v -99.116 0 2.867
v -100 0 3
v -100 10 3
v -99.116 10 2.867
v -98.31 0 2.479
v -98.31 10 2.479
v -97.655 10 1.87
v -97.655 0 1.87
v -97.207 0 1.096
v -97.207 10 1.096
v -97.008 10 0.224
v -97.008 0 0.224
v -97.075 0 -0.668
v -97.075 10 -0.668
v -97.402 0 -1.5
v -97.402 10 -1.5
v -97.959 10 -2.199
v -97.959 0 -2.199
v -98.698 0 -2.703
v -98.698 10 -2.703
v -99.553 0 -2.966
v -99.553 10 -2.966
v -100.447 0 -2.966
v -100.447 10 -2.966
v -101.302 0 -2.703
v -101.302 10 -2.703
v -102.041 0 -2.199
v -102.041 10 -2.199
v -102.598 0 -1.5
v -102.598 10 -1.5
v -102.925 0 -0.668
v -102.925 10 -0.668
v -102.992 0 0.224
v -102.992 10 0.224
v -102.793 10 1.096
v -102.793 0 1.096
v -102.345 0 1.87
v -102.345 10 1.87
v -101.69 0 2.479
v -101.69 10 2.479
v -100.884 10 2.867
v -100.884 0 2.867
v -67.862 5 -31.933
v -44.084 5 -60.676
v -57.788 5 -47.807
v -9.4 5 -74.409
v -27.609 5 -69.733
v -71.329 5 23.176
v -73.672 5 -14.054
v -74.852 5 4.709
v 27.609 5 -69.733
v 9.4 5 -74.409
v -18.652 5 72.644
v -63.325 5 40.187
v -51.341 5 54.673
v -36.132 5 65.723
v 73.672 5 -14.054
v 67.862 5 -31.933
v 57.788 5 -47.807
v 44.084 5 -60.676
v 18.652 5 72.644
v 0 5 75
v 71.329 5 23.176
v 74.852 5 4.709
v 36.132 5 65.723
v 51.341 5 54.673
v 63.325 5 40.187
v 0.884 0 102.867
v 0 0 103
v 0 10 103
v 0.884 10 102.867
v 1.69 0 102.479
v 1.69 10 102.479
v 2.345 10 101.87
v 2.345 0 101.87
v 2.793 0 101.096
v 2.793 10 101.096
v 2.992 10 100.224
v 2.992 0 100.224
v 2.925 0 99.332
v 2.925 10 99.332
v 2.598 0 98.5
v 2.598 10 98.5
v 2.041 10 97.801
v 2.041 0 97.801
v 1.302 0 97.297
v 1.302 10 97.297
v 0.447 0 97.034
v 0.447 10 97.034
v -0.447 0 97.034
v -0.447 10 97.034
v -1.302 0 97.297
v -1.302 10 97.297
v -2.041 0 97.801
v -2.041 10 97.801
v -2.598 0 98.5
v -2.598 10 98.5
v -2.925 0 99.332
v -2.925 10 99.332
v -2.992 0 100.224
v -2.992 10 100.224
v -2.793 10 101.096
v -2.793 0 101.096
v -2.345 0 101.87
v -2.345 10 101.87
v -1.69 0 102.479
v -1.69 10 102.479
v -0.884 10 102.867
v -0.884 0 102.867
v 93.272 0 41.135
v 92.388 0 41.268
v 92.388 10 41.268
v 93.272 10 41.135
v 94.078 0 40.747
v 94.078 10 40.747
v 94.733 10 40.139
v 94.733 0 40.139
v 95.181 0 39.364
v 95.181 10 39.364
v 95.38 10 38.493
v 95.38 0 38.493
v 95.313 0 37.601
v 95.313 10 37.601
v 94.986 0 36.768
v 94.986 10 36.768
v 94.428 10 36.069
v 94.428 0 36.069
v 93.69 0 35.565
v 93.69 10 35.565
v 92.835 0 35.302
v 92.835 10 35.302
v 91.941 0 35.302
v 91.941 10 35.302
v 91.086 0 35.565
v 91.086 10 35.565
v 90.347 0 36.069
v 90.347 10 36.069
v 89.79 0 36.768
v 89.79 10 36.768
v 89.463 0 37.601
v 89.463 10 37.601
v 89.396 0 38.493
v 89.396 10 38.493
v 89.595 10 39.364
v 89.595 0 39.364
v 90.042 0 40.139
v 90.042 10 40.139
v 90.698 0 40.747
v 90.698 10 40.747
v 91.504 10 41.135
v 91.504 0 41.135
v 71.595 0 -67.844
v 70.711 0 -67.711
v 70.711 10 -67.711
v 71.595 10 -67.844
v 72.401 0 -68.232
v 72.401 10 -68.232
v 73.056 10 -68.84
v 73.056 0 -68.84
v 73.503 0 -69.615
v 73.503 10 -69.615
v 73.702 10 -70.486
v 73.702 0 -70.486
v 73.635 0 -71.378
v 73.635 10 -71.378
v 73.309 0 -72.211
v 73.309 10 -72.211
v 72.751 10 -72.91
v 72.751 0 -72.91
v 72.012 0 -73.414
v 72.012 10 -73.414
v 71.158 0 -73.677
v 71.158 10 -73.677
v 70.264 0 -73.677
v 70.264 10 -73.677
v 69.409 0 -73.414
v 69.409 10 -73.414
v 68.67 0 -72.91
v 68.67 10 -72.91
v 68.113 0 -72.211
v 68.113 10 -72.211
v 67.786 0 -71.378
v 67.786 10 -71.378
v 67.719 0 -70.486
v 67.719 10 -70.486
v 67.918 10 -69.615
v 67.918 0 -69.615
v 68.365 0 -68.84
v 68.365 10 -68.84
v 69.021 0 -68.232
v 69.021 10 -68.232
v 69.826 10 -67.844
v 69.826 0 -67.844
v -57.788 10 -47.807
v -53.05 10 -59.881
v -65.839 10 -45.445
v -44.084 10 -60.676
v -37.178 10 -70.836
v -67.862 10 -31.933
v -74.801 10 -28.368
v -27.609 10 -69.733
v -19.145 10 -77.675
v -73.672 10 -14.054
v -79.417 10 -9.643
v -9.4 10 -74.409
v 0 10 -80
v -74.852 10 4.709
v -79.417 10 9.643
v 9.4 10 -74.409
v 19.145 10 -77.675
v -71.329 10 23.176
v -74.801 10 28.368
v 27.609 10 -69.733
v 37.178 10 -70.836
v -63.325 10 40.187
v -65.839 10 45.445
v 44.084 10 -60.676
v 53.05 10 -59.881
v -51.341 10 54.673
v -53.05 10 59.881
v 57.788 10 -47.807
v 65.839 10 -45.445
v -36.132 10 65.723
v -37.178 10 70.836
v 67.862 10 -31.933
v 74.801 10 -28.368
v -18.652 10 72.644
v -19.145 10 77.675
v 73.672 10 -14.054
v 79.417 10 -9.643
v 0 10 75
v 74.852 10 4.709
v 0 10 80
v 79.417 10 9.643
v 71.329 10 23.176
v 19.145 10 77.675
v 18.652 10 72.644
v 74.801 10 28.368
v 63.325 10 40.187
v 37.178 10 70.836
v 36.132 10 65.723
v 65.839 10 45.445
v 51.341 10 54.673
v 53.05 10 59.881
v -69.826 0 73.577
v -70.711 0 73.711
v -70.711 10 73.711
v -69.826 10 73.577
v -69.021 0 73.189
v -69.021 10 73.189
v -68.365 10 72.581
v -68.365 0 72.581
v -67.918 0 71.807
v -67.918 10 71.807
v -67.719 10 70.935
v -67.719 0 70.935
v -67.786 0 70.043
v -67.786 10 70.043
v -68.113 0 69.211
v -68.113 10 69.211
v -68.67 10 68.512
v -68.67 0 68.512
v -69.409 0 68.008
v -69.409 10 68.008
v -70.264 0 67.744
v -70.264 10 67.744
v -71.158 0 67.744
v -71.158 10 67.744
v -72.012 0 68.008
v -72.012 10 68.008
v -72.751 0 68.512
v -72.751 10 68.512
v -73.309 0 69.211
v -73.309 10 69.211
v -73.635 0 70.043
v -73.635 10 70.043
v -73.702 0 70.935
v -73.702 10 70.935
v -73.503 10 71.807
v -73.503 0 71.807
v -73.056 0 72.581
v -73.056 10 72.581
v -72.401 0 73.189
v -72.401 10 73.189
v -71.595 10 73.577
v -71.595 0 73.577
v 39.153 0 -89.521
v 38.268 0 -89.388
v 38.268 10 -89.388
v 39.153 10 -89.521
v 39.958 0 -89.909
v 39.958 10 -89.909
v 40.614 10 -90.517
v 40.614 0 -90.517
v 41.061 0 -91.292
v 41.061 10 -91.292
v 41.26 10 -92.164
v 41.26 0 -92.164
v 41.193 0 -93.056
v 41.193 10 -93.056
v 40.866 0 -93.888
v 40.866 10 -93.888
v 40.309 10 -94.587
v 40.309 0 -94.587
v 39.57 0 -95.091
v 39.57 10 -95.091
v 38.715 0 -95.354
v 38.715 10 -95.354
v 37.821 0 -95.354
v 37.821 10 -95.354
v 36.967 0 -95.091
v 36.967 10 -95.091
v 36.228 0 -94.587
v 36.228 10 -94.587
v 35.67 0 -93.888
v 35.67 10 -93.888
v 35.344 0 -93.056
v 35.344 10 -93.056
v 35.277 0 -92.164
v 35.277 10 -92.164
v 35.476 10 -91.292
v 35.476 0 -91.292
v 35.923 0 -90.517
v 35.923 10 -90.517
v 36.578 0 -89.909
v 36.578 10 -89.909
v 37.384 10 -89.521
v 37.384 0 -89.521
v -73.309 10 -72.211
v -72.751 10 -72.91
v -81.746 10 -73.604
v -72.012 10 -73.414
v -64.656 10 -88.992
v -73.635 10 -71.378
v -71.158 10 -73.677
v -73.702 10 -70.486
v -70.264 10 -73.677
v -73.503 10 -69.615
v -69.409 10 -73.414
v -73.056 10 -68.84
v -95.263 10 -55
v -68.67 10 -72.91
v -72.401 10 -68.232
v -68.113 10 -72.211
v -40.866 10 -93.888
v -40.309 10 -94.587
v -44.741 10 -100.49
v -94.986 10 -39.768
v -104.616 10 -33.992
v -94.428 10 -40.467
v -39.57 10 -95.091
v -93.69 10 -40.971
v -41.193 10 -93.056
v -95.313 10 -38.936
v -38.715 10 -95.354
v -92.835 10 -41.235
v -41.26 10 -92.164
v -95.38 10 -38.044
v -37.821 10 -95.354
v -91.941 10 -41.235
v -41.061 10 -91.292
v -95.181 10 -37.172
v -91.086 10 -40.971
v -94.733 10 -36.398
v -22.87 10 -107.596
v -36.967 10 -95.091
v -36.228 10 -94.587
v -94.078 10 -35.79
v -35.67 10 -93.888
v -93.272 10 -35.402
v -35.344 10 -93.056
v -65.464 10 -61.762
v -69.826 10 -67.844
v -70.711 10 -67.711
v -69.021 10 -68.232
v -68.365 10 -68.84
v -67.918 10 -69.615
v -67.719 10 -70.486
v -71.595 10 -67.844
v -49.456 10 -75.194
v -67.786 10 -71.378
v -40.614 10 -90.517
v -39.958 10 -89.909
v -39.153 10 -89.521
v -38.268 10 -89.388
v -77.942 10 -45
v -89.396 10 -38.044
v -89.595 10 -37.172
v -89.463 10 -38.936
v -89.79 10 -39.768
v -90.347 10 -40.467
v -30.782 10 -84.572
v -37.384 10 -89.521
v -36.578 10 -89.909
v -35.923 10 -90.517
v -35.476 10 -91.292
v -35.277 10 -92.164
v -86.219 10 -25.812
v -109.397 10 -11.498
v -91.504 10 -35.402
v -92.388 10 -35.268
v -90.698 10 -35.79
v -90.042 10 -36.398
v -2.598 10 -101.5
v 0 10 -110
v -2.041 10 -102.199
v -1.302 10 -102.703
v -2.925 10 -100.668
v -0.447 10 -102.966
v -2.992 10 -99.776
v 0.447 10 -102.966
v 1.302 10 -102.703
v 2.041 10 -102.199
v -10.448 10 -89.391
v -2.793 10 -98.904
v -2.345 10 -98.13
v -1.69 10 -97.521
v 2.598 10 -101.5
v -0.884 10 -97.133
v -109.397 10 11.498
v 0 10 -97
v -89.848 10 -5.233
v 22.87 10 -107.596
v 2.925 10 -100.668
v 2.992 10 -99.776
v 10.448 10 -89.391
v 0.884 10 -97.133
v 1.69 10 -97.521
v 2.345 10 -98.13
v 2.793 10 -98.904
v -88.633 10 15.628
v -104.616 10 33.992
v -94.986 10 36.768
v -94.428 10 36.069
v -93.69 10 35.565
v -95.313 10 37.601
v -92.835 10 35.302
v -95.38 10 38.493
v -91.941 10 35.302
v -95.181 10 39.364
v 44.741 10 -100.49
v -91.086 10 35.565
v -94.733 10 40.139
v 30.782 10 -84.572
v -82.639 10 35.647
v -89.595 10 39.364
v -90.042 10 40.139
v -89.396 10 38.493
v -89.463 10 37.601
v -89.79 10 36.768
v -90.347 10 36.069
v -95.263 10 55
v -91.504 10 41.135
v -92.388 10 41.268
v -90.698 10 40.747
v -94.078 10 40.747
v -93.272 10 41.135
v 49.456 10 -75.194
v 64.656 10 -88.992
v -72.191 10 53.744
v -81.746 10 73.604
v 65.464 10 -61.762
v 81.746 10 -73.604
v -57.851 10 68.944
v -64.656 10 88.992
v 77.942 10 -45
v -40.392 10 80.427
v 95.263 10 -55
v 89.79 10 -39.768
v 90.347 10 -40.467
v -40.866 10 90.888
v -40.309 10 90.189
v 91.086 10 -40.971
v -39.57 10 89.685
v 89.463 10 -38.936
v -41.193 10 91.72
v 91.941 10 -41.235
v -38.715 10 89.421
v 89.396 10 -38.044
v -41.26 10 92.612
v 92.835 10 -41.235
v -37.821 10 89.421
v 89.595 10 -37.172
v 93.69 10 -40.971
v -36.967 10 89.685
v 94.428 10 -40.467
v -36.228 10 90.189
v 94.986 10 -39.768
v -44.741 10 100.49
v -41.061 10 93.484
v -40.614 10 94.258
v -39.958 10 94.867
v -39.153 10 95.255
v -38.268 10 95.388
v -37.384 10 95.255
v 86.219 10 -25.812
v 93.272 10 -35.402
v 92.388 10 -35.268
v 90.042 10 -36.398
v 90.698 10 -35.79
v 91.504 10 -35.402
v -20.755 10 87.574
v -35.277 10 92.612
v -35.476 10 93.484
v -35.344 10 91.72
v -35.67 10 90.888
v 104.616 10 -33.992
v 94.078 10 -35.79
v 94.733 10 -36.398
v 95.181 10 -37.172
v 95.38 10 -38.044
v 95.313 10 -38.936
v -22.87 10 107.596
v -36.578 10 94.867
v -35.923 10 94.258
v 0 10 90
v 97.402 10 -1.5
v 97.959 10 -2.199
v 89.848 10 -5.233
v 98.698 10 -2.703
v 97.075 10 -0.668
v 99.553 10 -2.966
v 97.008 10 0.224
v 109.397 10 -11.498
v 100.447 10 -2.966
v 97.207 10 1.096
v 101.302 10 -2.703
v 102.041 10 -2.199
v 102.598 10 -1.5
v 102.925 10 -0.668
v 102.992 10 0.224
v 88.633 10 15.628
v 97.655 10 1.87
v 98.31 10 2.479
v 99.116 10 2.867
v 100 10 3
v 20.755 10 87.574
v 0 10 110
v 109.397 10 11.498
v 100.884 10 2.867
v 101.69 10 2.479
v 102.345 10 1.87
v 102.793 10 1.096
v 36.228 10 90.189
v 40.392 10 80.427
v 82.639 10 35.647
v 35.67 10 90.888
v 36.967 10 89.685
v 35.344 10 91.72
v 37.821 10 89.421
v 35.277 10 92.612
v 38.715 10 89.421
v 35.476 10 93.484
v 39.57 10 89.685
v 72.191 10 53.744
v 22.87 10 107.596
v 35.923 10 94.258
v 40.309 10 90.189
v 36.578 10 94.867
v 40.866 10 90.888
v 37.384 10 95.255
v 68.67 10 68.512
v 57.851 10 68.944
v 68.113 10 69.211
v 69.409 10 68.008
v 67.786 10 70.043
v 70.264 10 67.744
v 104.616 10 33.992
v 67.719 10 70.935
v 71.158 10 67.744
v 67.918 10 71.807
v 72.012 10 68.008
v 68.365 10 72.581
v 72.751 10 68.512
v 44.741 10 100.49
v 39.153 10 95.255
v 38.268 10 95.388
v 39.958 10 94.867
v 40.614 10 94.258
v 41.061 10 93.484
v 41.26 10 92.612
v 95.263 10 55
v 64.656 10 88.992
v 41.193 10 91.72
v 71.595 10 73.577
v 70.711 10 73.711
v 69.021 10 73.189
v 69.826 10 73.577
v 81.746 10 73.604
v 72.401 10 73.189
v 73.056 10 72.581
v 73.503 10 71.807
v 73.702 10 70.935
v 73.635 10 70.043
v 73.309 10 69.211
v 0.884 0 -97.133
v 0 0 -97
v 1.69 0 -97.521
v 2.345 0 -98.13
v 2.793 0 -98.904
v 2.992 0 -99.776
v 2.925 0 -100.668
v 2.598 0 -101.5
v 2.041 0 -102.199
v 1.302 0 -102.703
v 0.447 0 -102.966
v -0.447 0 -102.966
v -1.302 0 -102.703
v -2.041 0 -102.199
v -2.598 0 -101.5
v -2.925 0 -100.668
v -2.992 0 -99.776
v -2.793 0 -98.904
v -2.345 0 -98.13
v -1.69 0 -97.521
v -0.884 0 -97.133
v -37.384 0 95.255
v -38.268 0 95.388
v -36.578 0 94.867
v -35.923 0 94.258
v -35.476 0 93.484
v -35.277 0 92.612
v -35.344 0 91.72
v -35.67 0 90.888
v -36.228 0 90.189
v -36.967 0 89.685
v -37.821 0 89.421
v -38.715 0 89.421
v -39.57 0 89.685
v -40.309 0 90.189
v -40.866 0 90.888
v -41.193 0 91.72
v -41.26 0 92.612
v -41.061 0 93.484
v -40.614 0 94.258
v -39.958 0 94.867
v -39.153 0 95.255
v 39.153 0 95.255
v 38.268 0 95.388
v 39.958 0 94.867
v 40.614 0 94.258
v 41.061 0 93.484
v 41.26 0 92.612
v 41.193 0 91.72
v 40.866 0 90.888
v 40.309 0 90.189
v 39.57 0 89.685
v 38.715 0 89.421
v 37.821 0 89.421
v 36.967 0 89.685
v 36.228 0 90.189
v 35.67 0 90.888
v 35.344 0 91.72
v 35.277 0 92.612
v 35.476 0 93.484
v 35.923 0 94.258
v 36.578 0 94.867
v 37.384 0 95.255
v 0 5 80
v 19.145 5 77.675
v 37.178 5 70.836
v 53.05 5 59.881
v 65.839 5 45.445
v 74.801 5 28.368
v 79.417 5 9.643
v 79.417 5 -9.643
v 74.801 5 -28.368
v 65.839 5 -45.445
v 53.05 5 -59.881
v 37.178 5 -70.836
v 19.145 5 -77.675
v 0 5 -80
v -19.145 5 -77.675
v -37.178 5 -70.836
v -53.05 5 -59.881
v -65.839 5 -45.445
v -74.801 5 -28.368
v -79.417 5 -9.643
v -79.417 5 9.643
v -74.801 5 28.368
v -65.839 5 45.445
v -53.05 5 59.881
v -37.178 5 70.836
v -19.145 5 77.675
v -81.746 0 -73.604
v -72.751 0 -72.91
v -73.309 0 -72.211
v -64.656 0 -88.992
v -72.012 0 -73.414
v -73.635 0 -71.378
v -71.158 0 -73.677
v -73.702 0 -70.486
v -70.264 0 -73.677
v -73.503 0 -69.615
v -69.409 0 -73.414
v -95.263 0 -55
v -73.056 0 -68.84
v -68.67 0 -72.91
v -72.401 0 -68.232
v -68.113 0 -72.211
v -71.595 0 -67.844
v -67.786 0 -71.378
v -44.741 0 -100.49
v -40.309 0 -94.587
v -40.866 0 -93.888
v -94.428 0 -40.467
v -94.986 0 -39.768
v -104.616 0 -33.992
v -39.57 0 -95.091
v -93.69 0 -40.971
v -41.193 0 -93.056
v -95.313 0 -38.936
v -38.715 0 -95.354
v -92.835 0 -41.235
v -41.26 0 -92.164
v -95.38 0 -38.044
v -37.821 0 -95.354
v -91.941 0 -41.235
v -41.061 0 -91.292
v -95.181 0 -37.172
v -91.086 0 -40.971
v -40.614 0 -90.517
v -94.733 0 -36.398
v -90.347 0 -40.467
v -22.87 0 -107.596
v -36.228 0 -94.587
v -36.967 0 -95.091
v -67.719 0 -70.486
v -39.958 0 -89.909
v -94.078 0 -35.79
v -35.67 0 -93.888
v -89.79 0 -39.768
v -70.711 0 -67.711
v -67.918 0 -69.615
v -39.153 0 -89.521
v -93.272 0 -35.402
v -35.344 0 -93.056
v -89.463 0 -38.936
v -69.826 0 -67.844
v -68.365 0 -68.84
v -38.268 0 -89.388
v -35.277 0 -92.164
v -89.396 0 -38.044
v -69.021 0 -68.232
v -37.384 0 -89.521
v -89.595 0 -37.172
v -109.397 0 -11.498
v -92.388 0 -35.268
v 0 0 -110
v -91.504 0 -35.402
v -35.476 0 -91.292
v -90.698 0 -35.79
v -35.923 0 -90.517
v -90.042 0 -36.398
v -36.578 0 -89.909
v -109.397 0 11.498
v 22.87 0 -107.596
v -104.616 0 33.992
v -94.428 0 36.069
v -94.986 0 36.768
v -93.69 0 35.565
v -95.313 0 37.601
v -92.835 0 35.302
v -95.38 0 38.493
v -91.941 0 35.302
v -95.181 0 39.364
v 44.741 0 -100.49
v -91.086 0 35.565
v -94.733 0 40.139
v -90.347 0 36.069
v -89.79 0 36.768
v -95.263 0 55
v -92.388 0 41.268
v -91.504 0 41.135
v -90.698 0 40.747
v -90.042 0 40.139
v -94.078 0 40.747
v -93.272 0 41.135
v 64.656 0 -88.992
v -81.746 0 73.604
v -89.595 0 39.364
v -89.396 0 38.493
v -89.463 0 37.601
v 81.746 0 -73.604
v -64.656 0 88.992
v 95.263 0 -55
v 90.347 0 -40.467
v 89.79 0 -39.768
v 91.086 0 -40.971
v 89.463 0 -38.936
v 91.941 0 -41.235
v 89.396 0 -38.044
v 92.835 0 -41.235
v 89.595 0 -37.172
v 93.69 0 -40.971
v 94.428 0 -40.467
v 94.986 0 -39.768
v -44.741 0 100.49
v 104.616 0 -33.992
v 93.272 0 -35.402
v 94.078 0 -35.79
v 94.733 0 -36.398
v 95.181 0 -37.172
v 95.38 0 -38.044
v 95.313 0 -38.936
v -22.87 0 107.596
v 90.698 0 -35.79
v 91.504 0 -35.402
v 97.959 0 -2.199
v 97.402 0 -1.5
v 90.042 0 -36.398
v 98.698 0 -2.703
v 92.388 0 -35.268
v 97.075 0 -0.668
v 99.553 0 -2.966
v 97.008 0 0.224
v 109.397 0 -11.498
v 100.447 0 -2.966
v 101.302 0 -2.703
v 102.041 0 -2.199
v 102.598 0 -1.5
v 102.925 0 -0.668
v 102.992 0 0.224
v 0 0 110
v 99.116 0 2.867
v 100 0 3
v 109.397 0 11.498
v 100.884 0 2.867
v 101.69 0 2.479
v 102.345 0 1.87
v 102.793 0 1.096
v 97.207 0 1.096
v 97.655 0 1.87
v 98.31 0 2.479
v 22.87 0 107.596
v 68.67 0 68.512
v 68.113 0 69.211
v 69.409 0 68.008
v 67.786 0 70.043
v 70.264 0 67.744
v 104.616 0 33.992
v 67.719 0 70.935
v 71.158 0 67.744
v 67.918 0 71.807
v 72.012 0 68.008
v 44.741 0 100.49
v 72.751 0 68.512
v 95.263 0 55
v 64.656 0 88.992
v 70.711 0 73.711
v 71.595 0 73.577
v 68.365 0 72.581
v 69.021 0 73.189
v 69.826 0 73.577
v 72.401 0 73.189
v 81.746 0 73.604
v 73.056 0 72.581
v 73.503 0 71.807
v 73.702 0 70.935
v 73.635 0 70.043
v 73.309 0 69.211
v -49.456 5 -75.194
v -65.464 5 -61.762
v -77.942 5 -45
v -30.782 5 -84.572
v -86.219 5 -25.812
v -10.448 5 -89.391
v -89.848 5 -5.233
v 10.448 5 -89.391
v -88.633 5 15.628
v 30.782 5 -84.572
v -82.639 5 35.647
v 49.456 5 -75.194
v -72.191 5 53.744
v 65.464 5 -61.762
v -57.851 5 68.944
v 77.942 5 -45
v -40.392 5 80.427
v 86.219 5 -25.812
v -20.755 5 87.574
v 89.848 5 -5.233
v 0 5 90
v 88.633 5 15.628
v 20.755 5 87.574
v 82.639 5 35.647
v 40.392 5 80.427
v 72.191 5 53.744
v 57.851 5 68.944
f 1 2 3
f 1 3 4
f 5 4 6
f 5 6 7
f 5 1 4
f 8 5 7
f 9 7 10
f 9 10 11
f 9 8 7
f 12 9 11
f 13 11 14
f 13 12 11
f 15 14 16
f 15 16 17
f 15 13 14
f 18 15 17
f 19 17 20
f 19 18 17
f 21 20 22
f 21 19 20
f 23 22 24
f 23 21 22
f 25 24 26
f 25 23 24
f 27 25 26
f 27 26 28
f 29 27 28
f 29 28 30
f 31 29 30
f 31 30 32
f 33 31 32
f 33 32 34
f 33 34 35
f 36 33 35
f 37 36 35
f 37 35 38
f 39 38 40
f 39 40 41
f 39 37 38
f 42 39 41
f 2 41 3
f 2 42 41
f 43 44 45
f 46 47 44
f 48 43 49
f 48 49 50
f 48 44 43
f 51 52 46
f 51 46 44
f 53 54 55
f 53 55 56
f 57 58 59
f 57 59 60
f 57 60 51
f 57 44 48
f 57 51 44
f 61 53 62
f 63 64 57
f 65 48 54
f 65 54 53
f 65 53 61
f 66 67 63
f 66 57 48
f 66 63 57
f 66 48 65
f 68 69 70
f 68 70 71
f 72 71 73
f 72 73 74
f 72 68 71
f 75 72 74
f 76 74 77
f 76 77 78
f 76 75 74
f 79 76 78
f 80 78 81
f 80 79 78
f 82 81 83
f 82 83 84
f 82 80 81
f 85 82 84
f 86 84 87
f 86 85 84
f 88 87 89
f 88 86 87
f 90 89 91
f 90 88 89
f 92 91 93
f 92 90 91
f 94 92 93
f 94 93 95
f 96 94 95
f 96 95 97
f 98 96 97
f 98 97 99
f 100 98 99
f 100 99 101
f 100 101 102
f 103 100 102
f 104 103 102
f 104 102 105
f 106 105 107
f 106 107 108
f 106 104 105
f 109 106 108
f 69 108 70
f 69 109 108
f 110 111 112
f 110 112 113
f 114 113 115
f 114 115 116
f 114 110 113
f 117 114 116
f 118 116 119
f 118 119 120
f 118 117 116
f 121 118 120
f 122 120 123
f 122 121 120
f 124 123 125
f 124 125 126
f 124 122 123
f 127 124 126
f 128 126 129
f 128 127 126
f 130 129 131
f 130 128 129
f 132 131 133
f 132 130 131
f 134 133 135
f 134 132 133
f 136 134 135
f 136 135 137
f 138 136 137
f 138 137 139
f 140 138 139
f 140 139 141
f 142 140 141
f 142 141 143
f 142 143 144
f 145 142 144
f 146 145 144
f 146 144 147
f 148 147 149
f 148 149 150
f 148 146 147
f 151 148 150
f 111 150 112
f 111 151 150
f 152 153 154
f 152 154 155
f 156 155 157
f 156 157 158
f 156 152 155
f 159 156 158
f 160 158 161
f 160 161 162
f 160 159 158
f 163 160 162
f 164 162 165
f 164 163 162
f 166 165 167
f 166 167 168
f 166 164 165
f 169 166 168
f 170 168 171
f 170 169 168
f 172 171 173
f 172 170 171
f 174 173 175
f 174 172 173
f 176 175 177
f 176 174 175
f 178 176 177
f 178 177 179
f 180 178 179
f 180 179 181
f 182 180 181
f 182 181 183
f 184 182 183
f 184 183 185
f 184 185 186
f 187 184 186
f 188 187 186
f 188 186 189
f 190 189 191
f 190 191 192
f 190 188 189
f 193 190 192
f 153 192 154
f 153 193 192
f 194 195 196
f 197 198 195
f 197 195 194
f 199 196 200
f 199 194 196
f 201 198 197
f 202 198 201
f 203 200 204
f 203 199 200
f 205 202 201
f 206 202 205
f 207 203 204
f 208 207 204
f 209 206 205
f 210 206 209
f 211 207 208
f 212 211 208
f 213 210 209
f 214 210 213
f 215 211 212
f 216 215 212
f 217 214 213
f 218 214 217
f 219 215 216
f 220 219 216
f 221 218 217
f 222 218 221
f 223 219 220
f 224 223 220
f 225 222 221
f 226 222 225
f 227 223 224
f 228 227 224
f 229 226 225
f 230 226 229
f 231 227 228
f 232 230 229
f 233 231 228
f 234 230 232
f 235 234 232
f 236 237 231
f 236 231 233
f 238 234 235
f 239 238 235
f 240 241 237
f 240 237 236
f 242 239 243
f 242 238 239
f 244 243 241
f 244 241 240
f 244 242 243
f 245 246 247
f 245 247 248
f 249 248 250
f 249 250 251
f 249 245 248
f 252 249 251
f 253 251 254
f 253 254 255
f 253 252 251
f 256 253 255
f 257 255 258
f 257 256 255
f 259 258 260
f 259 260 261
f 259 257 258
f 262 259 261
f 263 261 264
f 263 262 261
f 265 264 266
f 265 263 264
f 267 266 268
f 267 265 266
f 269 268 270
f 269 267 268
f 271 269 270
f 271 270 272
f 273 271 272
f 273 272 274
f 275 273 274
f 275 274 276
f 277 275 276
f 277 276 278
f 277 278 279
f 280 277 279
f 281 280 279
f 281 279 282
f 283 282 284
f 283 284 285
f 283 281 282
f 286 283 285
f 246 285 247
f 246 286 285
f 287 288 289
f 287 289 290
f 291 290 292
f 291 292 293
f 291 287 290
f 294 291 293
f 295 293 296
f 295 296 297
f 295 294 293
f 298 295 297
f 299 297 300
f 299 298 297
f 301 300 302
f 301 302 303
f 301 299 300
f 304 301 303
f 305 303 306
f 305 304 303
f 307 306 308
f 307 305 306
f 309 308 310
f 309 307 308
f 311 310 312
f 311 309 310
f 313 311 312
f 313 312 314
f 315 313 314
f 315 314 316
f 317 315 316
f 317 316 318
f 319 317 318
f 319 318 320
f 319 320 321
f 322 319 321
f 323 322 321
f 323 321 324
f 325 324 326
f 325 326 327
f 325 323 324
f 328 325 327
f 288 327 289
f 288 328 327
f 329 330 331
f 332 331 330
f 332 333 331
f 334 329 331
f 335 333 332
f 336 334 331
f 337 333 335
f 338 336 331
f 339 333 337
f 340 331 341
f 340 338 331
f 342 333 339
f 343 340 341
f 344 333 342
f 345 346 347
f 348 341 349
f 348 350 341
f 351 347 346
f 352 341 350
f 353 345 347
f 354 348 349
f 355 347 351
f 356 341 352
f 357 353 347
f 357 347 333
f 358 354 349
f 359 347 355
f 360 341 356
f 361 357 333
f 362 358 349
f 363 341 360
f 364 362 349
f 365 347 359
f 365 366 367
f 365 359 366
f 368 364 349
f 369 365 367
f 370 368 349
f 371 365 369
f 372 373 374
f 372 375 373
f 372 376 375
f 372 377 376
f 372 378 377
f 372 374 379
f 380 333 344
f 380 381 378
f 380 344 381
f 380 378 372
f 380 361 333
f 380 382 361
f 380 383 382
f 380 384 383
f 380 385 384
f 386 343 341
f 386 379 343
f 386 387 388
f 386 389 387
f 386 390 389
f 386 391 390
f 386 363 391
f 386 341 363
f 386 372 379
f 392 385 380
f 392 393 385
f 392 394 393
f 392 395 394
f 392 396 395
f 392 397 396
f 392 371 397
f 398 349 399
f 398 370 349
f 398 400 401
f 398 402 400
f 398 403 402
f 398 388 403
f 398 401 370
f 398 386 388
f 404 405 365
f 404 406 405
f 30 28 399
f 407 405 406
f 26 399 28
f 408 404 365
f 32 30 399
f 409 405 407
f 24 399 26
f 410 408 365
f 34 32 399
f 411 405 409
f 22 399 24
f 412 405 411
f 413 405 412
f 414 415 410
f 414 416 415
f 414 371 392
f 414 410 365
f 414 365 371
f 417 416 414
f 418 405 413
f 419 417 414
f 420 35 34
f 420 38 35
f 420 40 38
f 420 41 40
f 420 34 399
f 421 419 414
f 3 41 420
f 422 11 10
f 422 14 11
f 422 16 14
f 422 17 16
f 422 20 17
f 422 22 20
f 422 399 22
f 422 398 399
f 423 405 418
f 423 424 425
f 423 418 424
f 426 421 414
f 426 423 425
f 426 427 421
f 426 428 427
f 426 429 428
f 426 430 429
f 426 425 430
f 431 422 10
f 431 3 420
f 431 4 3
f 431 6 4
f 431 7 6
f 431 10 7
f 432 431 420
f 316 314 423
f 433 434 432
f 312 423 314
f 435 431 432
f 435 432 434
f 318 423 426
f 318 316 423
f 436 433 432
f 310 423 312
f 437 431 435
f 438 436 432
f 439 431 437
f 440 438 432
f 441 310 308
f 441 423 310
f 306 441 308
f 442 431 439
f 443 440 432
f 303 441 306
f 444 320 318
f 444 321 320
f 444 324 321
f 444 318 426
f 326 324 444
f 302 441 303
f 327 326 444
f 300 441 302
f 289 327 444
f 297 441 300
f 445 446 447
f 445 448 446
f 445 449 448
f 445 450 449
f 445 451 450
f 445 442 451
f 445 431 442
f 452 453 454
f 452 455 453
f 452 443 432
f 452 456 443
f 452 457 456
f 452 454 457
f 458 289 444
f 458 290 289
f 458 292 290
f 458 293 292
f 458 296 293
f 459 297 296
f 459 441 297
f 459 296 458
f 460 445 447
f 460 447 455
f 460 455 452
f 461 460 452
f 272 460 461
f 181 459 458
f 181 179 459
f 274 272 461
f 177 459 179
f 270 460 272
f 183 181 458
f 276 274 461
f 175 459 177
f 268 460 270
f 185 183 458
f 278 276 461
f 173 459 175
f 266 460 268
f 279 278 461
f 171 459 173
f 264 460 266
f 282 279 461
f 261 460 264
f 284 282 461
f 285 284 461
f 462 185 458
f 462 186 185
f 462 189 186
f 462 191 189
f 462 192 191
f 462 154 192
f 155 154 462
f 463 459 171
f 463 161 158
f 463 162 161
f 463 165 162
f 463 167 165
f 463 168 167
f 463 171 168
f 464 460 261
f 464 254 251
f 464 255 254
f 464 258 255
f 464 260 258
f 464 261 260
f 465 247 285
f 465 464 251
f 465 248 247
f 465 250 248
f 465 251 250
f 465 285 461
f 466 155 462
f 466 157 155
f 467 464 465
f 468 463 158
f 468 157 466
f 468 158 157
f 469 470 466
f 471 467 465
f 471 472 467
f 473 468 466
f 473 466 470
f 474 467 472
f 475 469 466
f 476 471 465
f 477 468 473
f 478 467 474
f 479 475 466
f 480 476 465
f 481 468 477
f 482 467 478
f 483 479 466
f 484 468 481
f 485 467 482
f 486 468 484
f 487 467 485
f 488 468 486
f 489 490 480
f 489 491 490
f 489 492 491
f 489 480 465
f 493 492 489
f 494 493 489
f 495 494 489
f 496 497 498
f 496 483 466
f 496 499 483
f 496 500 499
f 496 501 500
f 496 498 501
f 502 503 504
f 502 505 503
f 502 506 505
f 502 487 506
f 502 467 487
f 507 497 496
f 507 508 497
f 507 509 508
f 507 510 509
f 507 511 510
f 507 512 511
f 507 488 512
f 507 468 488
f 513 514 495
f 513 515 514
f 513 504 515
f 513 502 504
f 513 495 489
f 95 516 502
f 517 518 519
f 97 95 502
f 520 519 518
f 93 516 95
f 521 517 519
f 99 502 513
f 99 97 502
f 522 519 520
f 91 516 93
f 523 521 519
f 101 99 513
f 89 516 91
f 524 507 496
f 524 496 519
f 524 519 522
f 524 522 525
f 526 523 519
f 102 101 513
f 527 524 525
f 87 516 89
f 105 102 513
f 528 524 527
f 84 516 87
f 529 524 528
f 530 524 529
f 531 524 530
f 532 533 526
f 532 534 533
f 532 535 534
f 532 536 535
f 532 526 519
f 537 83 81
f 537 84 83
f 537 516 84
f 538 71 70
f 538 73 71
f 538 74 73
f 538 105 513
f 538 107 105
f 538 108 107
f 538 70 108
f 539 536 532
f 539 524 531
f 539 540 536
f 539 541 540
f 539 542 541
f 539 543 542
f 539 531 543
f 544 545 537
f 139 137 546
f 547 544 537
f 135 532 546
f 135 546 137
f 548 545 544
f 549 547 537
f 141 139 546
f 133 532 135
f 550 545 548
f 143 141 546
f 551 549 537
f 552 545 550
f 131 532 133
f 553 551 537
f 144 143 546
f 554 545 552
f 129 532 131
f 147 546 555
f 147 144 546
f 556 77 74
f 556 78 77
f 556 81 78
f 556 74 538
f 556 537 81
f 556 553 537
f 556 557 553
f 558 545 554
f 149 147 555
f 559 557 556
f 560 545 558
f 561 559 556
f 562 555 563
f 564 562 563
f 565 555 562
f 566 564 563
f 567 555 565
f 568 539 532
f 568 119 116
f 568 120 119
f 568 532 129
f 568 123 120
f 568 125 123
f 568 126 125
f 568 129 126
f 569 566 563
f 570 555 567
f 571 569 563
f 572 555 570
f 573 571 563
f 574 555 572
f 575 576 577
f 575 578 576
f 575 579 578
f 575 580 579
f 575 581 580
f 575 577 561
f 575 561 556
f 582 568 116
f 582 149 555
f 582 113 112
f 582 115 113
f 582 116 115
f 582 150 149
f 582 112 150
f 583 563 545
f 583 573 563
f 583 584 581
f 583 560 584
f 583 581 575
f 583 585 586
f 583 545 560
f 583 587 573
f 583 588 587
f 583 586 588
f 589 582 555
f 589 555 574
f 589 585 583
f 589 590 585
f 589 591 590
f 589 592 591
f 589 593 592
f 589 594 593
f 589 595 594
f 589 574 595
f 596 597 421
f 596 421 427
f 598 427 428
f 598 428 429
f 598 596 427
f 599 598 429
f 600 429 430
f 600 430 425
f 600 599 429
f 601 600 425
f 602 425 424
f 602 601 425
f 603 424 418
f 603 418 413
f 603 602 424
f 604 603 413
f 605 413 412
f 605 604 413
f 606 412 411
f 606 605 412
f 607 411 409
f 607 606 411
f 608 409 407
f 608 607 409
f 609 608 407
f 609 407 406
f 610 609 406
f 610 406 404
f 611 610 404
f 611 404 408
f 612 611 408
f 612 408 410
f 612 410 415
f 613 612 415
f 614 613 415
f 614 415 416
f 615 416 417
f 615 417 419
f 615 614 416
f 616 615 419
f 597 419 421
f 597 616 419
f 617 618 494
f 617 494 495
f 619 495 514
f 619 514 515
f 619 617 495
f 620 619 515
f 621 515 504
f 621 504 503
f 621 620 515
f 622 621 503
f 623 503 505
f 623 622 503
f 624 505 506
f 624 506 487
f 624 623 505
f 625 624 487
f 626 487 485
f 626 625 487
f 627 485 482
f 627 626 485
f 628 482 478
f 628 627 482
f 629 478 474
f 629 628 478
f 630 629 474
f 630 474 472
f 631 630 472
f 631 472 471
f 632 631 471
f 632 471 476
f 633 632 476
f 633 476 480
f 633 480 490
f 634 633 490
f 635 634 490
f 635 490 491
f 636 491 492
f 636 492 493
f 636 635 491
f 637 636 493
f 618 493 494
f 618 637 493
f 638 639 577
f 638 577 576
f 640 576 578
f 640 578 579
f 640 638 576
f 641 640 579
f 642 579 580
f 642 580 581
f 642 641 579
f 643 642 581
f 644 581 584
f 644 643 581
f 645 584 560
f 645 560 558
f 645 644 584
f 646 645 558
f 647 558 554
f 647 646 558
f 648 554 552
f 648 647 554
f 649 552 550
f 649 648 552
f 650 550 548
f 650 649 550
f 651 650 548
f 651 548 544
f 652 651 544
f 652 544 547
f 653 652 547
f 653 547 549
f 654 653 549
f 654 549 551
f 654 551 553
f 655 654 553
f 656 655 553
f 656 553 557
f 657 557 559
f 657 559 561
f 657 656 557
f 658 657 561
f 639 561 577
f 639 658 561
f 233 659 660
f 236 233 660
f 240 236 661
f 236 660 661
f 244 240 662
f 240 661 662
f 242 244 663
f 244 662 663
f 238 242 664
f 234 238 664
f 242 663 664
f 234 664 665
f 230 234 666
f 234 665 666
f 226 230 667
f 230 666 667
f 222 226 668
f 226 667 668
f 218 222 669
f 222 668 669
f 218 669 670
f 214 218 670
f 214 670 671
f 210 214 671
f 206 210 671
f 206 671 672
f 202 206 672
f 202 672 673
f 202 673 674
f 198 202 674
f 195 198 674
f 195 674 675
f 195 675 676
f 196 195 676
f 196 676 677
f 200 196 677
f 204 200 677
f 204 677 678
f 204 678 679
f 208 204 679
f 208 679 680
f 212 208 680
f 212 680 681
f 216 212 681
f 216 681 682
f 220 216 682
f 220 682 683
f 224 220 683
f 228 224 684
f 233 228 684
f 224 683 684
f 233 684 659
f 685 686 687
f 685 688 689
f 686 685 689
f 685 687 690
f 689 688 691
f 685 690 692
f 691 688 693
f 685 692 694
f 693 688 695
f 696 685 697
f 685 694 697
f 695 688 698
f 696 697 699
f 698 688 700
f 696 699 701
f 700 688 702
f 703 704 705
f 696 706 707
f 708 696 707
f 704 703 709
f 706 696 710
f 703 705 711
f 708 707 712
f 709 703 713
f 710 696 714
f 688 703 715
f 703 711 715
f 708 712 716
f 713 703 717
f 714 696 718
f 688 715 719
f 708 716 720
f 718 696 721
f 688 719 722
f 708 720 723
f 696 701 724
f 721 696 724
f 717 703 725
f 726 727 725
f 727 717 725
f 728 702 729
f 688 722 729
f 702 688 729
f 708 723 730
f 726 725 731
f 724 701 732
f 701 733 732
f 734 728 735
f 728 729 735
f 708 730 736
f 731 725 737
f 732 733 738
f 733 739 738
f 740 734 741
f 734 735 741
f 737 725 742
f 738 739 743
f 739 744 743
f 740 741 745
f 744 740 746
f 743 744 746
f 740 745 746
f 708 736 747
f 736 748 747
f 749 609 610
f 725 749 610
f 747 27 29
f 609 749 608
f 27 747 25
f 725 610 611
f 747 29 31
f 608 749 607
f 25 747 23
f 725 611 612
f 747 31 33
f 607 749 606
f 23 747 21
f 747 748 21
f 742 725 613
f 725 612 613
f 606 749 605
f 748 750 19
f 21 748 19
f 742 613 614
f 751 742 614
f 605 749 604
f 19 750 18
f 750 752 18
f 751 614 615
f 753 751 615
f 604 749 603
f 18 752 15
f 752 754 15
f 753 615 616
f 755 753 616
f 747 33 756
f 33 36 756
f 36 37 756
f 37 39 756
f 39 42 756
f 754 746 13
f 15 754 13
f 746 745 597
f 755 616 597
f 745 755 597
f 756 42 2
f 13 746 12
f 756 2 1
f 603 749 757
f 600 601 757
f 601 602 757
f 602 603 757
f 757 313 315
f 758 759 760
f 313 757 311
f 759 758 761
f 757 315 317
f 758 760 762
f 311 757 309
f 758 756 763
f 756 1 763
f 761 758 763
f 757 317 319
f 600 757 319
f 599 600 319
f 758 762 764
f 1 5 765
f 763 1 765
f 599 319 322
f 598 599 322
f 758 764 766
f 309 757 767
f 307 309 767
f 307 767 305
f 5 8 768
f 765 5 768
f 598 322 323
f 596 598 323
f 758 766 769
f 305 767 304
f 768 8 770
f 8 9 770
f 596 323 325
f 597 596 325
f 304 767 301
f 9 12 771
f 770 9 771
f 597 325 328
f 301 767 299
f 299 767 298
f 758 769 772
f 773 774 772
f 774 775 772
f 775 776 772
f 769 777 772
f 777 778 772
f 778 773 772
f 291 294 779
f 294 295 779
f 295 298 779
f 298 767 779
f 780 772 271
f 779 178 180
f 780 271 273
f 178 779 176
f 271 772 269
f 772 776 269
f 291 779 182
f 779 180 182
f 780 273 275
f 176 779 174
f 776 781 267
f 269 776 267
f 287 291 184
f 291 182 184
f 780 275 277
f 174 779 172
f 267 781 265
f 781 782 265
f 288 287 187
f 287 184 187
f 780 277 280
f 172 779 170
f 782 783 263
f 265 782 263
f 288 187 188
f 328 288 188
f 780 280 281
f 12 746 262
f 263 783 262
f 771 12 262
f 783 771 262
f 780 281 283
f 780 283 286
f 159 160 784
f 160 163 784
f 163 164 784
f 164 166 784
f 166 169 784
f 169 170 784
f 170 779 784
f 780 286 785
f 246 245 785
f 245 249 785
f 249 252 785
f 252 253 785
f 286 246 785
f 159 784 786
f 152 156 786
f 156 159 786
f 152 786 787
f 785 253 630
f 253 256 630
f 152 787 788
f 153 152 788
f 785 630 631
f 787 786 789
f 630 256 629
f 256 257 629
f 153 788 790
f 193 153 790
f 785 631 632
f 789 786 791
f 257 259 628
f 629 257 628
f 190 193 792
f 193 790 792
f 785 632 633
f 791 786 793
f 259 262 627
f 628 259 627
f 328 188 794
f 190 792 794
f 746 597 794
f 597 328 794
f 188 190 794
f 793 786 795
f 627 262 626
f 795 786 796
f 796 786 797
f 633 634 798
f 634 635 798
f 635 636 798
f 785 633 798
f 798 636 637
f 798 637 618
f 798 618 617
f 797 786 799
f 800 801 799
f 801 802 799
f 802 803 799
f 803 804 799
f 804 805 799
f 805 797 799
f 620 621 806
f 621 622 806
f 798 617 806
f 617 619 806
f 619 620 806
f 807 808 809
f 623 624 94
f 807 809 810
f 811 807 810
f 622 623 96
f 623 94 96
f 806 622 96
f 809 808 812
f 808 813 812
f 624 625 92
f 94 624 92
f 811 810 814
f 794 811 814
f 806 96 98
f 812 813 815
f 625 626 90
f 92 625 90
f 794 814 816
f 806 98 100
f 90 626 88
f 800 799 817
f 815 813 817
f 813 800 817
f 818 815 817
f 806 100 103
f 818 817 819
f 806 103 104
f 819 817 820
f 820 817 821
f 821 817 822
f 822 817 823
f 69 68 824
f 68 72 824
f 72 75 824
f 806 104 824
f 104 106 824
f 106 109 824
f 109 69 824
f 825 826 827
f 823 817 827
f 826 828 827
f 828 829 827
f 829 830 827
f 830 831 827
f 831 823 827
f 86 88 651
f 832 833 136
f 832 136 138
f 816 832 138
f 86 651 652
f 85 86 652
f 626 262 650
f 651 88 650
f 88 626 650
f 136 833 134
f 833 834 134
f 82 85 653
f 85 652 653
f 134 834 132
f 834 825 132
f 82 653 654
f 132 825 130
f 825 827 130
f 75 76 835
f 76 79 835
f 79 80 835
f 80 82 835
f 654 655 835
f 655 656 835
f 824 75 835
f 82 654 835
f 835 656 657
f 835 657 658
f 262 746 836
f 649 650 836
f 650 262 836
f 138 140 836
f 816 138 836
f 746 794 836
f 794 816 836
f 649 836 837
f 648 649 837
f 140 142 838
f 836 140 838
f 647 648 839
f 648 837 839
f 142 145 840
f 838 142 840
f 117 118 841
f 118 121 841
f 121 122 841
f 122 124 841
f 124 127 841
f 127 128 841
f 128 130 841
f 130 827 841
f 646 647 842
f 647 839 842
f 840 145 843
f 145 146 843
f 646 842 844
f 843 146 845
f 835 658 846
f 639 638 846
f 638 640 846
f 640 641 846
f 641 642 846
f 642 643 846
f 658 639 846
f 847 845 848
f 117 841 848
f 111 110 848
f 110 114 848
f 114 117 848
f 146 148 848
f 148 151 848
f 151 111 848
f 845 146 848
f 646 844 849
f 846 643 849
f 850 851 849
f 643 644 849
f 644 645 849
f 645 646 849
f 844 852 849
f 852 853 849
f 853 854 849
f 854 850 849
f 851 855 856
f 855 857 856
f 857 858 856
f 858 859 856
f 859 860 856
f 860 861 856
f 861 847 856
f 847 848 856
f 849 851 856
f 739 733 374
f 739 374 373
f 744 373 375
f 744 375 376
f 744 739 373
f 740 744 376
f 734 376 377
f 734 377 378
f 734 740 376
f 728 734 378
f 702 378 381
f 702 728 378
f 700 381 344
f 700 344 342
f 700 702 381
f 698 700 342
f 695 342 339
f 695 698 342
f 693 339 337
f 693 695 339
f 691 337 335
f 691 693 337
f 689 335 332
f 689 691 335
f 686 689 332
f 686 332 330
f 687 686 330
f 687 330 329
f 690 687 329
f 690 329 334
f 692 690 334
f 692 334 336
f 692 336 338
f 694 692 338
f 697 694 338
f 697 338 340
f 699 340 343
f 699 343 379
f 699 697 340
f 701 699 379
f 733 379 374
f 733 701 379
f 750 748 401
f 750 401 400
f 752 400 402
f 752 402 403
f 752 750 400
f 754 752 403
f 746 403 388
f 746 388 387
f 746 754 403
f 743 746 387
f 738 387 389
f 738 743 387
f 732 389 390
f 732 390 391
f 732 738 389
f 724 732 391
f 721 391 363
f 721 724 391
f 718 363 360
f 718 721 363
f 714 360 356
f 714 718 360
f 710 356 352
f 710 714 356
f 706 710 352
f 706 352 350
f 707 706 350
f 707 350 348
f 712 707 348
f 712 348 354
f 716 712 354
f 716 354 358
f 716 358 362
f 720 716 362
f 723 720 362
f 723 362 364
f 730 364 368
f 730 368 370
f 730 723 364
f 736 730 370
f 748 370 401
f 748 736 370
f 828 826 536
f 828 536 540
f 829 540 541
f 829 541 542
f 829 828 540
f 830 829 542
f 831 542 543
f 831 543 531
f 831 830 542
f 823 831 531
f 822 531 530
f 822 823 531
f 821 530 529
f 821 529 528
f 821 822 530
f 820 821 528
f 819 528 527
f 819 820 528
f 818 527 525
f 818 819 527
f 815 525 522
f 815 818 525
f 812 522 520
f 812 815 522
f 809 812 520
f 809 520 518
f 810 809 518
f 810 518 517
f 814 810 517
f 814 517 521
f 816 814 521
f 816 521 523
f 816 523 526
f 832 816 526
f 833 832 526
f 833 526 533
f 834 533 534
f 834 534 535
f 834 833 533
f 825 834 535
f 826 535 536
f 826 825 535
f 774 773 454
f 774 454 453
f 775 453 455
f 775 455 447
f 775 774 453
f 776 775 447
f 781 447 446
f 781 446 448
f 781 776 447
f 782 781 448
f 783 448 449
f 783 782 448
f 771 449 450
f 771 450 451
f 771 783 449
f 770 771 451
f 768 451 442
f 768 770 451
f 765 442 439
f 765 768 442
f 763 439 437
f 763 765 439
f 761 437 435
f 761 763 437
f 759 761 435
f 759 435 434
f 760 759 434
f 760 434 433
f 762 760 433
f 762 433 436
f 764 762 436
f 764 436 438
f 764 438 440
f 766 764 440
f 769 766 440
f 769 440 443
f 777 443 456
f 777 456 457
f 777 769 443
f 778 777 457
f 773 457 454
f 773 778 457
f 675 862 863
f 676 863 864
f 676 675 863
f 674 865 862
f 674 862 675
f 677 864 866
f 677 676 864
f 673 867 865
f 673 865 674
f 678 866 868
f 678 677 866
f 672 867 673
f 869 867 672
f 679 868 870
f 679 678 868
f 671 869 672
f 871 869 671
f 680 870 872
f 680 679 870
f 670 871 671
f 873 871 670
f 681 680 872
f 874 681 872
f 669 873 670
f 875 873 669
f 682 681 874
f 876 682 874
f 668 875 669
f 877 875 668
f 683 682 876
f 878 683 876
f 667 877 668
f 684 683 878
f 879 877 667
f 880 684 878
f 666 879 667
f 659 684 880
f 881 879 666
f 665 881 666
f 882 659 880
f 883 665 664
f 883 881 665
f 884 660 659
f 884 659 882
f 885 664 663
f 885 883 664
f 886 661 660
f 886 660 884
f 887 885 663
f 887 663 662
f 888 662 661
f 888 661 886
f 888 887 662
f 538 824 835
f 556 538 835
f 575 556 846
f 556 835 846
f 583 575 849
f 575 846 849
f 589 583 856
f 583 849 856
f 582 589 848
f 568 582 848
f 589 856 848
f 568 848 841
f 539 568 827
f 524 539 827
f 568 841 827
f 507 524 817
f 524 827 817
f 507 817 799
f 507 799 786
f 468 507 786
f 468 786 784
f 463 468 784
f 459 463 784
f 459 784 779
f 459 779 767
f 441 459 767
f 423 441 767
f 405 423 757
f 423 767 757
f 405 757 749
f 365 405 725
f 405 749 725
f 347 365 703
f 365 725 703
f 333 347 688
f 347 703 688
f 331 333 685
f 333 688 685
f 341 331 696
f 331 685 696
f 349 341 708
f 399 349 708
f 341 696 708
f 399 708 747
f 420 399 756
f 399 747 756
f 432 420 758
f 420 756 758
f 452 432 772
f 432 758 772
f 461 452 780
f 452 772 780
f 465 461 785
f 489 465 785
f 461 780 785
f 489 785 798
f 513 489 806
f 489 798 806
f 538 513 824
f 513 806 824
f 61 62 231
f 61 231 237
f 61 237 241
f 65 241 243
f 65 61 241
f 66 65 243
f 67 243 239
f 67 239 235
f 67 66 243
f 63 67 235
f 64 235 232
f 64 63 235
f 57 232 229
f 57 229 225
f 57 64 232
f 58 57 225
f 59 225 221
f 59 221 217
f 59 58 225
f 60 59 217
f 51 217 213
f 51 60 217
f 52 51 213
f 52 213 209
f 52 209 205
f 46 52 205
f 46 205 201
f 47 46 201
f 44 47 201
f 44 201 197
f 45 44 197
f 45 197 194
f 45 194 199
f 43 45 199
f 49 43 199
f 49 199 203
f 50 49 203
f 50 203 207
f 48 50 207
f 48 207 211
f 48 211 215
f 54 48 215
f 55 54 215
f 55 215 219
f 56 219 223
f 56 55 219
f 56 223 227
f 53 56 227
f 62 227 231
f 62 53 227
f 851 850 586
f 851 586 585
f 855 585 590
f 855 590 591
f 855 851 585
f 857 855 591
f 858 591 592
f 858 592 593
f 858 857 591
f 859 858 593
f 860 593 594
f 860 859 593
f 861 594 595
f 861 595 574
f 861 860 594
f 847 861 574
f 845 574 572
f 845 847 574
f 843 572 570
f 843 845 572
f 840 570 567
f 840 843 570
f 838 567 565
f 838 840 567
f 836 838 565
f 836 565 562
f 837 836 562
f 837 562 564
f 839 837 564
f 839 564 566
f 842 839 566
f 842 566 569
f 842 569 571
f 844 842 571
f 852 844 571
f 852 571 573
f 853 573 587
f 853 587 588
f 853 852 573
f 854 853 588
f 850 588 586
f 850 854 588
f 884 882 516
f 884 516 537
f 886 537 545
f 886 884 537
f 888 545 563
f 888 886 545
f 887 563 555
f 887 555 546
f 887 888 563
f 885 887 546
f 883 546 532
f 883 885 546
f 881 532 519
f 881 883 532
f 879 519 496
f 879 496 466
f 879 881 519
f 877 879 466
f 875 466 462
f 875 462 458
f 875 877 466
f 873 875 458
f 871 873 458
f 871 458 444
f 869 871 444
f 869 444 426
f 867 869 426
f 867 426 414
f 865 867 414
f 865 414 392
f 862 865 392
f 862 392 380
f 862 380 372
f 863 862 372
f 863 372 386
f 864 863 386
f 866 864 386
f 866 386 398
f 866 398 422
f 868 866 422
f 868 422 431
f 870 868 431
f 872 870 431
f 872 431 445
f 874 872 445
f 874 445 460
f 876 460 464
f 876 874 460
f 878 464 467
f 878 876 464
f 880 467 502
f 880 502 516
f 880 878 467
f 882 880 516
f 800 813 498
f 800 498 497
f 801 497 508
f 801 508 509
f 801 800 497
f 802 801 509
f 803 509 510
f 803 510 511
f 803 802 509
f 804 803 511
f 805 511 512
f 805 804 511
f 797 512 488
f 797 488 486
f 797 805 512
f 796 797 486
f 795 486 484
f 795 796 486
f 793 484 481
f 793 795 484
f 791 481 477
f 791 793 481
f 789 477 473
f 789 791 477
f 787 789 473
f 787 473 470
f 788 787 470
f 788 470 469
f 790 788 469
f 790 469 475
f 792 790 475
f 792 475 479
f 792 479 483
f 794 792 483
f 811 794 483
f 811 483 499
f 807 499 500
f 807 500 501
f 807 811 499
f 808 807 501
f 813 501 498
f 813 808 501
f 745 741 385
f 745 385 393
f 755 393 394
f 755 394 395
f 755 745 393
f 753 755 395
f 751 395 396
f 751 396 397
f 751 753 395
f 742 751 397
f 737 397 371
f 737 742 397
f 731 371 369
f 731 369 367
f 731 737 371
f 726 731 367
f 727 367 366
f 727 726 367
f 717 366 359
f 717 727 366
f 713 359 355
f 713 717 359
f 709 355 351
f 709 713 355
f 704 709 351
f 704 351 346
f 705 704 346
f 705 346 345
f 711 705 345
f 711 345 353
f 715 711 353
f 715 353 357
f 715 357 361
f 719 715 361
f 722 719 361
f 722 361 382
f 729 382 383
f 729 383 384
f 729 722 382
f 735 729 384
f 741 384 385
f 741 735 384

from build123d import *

# Parameters (mm, degrees)
SKETCH_1_R        = 80
SKETCH_1_R_2      = 75
EXTRUDE_1_DEPTH   = 10
SKETCH_1_R_3      = 110
SKETCH_1_R_4      = 3
SKETCH_1_R_5      = 90
EXTRUDE_1_2_DEPTH = 10
SKETCH_1_3_R      = 90
SKETCH_1_3_R_2    = 80
SKETCH_1_3_R_3    = 75
EXTRUDE_2_DEPTH   = 5


with BuildPart() as part:
    # 草图1 → 凸台-拉伸1 (new body)
    with BuildSketch(Plane(origin=(0, 0, 0), x_dir=(1, 0, 0), z_dir=(0, 1, 0))):
        Circle(SKETCH_1_R)
        Circle(SKETCH_1_R_2, mode=Mode.SUBTRACT)
    extrude(amount=EXTRUDE_1_DEPTH)



with BuildPart() as body_2:
    # 草图1 → Extrude 1 2 (new body)
    with BuildSketch(Plane(origin=(0, 0, 0), x_dir=(1, 0, 0), z_dir=(0, 1, 0))):
        Circle(SKETCH_1_R_3)
        with Locations((-70.710678119, -70.710678119)):
            Circle(SKETCH_1_R_4, mode=Mode.SUBTRACT)
        with Locations((-38.268343237, -92.387953251)):
            Circle(SKETCH_1_R_4, mode=Mode.SUBTRACT)
        with Locations((-92.387953251, -38.268343237)):
            Circle(SKETCH_1_R_4, mode=Mode.SUBTRACT)
        with Locations((-100, 0)):
            Circle(SKETCH_1_R_4, mode=Mode.SUBTRACT)
        with Locations((0, -100)):
            Circle(SKETCH_1_R_4, mode=Mode.SUBTRACT)
        with Locations((38.268343237, -92.387953251)):
            Circle(SKETCH_1_R_4, mode=Mode.SUBTRACT)
        with Locations((70.710678119, -70.710678119)):
            Circle(SKETCH_1_R_4, mode=Mode.SUBTRACT)
        with Locations((92.387953251, -38.268343237)):
            Circle(SKETCH_1_R_4, mode=Mode.SUBTRACT)
        with Locations((-92.387953251, 38.268343237)):
            Circle(SKETCH_1_R_4, mode=Mode.SUBTRACT)
        with Locations((-70.710678119, 70.710678119)):
            Circle(SKETCH_1_R_4, mode=Mode.SUBTRACT)
        with Locations((-38.268343237, 92.387953251)):
            Circle(SKETCH_1_R_4, mode=Mode.SUBTRACT)
        Circle(SKETCH_1_R_5, mode=Mode.SUBTRACT)
        with Locations((100, 0)):
            Circle(SKETCH_1_R_4, mode=Mode.SUBTRACT)
        with Locations((92.387953251, 38.268343237)):
            Circle(SKETCH_1_R_4, mode=Mode.SUBTRACT)
        with Locations((0, 100)):
            Circle(SKETCH_1_R_4, mode=Mode.SUBTRACT)
        with Locations((38.268343237, 92.387953251)):
            Circle(SKETCH_1_R_4, mode=Mode.SUBTRACT)
        with Locations((70.710678119, 70.710678119)):
            Circle(SKETCH_1_R_4, mode=Mode.SUBTRACT)
    extrude(amount=EXTRUDE_1_2_DEPTH)


with BuildPart() as part_1:
    add(part.part)

    add(body_2.part)  # 凸台-拉伸2 merges body 2
    # 草图1<3> → 凸台-拉伸2 (add)
    # profile 1 of 2: a face of its own
    with BuildSketch(Plane(origin=(0, 0, 0), x_dir=(1, 0, 0), z_dir=(0, 1, 0))):
        Circle(SKETCH_1_3_R)
        Circle(SKETCH_1_3_R_2, mode=Mode.SUBTRACT)
    # profile 2 of 2: a face of its own
    with BuildSketch(Plane(origin=(0, 0, 0), x_dir=(1, 0, 0), z_dir=(0, 1, 0))):
        Circle(SKETCH_1_3_R_3)
    extrude(amount=EXTRUDE_2_DEPTH)


solid = part_1.part
